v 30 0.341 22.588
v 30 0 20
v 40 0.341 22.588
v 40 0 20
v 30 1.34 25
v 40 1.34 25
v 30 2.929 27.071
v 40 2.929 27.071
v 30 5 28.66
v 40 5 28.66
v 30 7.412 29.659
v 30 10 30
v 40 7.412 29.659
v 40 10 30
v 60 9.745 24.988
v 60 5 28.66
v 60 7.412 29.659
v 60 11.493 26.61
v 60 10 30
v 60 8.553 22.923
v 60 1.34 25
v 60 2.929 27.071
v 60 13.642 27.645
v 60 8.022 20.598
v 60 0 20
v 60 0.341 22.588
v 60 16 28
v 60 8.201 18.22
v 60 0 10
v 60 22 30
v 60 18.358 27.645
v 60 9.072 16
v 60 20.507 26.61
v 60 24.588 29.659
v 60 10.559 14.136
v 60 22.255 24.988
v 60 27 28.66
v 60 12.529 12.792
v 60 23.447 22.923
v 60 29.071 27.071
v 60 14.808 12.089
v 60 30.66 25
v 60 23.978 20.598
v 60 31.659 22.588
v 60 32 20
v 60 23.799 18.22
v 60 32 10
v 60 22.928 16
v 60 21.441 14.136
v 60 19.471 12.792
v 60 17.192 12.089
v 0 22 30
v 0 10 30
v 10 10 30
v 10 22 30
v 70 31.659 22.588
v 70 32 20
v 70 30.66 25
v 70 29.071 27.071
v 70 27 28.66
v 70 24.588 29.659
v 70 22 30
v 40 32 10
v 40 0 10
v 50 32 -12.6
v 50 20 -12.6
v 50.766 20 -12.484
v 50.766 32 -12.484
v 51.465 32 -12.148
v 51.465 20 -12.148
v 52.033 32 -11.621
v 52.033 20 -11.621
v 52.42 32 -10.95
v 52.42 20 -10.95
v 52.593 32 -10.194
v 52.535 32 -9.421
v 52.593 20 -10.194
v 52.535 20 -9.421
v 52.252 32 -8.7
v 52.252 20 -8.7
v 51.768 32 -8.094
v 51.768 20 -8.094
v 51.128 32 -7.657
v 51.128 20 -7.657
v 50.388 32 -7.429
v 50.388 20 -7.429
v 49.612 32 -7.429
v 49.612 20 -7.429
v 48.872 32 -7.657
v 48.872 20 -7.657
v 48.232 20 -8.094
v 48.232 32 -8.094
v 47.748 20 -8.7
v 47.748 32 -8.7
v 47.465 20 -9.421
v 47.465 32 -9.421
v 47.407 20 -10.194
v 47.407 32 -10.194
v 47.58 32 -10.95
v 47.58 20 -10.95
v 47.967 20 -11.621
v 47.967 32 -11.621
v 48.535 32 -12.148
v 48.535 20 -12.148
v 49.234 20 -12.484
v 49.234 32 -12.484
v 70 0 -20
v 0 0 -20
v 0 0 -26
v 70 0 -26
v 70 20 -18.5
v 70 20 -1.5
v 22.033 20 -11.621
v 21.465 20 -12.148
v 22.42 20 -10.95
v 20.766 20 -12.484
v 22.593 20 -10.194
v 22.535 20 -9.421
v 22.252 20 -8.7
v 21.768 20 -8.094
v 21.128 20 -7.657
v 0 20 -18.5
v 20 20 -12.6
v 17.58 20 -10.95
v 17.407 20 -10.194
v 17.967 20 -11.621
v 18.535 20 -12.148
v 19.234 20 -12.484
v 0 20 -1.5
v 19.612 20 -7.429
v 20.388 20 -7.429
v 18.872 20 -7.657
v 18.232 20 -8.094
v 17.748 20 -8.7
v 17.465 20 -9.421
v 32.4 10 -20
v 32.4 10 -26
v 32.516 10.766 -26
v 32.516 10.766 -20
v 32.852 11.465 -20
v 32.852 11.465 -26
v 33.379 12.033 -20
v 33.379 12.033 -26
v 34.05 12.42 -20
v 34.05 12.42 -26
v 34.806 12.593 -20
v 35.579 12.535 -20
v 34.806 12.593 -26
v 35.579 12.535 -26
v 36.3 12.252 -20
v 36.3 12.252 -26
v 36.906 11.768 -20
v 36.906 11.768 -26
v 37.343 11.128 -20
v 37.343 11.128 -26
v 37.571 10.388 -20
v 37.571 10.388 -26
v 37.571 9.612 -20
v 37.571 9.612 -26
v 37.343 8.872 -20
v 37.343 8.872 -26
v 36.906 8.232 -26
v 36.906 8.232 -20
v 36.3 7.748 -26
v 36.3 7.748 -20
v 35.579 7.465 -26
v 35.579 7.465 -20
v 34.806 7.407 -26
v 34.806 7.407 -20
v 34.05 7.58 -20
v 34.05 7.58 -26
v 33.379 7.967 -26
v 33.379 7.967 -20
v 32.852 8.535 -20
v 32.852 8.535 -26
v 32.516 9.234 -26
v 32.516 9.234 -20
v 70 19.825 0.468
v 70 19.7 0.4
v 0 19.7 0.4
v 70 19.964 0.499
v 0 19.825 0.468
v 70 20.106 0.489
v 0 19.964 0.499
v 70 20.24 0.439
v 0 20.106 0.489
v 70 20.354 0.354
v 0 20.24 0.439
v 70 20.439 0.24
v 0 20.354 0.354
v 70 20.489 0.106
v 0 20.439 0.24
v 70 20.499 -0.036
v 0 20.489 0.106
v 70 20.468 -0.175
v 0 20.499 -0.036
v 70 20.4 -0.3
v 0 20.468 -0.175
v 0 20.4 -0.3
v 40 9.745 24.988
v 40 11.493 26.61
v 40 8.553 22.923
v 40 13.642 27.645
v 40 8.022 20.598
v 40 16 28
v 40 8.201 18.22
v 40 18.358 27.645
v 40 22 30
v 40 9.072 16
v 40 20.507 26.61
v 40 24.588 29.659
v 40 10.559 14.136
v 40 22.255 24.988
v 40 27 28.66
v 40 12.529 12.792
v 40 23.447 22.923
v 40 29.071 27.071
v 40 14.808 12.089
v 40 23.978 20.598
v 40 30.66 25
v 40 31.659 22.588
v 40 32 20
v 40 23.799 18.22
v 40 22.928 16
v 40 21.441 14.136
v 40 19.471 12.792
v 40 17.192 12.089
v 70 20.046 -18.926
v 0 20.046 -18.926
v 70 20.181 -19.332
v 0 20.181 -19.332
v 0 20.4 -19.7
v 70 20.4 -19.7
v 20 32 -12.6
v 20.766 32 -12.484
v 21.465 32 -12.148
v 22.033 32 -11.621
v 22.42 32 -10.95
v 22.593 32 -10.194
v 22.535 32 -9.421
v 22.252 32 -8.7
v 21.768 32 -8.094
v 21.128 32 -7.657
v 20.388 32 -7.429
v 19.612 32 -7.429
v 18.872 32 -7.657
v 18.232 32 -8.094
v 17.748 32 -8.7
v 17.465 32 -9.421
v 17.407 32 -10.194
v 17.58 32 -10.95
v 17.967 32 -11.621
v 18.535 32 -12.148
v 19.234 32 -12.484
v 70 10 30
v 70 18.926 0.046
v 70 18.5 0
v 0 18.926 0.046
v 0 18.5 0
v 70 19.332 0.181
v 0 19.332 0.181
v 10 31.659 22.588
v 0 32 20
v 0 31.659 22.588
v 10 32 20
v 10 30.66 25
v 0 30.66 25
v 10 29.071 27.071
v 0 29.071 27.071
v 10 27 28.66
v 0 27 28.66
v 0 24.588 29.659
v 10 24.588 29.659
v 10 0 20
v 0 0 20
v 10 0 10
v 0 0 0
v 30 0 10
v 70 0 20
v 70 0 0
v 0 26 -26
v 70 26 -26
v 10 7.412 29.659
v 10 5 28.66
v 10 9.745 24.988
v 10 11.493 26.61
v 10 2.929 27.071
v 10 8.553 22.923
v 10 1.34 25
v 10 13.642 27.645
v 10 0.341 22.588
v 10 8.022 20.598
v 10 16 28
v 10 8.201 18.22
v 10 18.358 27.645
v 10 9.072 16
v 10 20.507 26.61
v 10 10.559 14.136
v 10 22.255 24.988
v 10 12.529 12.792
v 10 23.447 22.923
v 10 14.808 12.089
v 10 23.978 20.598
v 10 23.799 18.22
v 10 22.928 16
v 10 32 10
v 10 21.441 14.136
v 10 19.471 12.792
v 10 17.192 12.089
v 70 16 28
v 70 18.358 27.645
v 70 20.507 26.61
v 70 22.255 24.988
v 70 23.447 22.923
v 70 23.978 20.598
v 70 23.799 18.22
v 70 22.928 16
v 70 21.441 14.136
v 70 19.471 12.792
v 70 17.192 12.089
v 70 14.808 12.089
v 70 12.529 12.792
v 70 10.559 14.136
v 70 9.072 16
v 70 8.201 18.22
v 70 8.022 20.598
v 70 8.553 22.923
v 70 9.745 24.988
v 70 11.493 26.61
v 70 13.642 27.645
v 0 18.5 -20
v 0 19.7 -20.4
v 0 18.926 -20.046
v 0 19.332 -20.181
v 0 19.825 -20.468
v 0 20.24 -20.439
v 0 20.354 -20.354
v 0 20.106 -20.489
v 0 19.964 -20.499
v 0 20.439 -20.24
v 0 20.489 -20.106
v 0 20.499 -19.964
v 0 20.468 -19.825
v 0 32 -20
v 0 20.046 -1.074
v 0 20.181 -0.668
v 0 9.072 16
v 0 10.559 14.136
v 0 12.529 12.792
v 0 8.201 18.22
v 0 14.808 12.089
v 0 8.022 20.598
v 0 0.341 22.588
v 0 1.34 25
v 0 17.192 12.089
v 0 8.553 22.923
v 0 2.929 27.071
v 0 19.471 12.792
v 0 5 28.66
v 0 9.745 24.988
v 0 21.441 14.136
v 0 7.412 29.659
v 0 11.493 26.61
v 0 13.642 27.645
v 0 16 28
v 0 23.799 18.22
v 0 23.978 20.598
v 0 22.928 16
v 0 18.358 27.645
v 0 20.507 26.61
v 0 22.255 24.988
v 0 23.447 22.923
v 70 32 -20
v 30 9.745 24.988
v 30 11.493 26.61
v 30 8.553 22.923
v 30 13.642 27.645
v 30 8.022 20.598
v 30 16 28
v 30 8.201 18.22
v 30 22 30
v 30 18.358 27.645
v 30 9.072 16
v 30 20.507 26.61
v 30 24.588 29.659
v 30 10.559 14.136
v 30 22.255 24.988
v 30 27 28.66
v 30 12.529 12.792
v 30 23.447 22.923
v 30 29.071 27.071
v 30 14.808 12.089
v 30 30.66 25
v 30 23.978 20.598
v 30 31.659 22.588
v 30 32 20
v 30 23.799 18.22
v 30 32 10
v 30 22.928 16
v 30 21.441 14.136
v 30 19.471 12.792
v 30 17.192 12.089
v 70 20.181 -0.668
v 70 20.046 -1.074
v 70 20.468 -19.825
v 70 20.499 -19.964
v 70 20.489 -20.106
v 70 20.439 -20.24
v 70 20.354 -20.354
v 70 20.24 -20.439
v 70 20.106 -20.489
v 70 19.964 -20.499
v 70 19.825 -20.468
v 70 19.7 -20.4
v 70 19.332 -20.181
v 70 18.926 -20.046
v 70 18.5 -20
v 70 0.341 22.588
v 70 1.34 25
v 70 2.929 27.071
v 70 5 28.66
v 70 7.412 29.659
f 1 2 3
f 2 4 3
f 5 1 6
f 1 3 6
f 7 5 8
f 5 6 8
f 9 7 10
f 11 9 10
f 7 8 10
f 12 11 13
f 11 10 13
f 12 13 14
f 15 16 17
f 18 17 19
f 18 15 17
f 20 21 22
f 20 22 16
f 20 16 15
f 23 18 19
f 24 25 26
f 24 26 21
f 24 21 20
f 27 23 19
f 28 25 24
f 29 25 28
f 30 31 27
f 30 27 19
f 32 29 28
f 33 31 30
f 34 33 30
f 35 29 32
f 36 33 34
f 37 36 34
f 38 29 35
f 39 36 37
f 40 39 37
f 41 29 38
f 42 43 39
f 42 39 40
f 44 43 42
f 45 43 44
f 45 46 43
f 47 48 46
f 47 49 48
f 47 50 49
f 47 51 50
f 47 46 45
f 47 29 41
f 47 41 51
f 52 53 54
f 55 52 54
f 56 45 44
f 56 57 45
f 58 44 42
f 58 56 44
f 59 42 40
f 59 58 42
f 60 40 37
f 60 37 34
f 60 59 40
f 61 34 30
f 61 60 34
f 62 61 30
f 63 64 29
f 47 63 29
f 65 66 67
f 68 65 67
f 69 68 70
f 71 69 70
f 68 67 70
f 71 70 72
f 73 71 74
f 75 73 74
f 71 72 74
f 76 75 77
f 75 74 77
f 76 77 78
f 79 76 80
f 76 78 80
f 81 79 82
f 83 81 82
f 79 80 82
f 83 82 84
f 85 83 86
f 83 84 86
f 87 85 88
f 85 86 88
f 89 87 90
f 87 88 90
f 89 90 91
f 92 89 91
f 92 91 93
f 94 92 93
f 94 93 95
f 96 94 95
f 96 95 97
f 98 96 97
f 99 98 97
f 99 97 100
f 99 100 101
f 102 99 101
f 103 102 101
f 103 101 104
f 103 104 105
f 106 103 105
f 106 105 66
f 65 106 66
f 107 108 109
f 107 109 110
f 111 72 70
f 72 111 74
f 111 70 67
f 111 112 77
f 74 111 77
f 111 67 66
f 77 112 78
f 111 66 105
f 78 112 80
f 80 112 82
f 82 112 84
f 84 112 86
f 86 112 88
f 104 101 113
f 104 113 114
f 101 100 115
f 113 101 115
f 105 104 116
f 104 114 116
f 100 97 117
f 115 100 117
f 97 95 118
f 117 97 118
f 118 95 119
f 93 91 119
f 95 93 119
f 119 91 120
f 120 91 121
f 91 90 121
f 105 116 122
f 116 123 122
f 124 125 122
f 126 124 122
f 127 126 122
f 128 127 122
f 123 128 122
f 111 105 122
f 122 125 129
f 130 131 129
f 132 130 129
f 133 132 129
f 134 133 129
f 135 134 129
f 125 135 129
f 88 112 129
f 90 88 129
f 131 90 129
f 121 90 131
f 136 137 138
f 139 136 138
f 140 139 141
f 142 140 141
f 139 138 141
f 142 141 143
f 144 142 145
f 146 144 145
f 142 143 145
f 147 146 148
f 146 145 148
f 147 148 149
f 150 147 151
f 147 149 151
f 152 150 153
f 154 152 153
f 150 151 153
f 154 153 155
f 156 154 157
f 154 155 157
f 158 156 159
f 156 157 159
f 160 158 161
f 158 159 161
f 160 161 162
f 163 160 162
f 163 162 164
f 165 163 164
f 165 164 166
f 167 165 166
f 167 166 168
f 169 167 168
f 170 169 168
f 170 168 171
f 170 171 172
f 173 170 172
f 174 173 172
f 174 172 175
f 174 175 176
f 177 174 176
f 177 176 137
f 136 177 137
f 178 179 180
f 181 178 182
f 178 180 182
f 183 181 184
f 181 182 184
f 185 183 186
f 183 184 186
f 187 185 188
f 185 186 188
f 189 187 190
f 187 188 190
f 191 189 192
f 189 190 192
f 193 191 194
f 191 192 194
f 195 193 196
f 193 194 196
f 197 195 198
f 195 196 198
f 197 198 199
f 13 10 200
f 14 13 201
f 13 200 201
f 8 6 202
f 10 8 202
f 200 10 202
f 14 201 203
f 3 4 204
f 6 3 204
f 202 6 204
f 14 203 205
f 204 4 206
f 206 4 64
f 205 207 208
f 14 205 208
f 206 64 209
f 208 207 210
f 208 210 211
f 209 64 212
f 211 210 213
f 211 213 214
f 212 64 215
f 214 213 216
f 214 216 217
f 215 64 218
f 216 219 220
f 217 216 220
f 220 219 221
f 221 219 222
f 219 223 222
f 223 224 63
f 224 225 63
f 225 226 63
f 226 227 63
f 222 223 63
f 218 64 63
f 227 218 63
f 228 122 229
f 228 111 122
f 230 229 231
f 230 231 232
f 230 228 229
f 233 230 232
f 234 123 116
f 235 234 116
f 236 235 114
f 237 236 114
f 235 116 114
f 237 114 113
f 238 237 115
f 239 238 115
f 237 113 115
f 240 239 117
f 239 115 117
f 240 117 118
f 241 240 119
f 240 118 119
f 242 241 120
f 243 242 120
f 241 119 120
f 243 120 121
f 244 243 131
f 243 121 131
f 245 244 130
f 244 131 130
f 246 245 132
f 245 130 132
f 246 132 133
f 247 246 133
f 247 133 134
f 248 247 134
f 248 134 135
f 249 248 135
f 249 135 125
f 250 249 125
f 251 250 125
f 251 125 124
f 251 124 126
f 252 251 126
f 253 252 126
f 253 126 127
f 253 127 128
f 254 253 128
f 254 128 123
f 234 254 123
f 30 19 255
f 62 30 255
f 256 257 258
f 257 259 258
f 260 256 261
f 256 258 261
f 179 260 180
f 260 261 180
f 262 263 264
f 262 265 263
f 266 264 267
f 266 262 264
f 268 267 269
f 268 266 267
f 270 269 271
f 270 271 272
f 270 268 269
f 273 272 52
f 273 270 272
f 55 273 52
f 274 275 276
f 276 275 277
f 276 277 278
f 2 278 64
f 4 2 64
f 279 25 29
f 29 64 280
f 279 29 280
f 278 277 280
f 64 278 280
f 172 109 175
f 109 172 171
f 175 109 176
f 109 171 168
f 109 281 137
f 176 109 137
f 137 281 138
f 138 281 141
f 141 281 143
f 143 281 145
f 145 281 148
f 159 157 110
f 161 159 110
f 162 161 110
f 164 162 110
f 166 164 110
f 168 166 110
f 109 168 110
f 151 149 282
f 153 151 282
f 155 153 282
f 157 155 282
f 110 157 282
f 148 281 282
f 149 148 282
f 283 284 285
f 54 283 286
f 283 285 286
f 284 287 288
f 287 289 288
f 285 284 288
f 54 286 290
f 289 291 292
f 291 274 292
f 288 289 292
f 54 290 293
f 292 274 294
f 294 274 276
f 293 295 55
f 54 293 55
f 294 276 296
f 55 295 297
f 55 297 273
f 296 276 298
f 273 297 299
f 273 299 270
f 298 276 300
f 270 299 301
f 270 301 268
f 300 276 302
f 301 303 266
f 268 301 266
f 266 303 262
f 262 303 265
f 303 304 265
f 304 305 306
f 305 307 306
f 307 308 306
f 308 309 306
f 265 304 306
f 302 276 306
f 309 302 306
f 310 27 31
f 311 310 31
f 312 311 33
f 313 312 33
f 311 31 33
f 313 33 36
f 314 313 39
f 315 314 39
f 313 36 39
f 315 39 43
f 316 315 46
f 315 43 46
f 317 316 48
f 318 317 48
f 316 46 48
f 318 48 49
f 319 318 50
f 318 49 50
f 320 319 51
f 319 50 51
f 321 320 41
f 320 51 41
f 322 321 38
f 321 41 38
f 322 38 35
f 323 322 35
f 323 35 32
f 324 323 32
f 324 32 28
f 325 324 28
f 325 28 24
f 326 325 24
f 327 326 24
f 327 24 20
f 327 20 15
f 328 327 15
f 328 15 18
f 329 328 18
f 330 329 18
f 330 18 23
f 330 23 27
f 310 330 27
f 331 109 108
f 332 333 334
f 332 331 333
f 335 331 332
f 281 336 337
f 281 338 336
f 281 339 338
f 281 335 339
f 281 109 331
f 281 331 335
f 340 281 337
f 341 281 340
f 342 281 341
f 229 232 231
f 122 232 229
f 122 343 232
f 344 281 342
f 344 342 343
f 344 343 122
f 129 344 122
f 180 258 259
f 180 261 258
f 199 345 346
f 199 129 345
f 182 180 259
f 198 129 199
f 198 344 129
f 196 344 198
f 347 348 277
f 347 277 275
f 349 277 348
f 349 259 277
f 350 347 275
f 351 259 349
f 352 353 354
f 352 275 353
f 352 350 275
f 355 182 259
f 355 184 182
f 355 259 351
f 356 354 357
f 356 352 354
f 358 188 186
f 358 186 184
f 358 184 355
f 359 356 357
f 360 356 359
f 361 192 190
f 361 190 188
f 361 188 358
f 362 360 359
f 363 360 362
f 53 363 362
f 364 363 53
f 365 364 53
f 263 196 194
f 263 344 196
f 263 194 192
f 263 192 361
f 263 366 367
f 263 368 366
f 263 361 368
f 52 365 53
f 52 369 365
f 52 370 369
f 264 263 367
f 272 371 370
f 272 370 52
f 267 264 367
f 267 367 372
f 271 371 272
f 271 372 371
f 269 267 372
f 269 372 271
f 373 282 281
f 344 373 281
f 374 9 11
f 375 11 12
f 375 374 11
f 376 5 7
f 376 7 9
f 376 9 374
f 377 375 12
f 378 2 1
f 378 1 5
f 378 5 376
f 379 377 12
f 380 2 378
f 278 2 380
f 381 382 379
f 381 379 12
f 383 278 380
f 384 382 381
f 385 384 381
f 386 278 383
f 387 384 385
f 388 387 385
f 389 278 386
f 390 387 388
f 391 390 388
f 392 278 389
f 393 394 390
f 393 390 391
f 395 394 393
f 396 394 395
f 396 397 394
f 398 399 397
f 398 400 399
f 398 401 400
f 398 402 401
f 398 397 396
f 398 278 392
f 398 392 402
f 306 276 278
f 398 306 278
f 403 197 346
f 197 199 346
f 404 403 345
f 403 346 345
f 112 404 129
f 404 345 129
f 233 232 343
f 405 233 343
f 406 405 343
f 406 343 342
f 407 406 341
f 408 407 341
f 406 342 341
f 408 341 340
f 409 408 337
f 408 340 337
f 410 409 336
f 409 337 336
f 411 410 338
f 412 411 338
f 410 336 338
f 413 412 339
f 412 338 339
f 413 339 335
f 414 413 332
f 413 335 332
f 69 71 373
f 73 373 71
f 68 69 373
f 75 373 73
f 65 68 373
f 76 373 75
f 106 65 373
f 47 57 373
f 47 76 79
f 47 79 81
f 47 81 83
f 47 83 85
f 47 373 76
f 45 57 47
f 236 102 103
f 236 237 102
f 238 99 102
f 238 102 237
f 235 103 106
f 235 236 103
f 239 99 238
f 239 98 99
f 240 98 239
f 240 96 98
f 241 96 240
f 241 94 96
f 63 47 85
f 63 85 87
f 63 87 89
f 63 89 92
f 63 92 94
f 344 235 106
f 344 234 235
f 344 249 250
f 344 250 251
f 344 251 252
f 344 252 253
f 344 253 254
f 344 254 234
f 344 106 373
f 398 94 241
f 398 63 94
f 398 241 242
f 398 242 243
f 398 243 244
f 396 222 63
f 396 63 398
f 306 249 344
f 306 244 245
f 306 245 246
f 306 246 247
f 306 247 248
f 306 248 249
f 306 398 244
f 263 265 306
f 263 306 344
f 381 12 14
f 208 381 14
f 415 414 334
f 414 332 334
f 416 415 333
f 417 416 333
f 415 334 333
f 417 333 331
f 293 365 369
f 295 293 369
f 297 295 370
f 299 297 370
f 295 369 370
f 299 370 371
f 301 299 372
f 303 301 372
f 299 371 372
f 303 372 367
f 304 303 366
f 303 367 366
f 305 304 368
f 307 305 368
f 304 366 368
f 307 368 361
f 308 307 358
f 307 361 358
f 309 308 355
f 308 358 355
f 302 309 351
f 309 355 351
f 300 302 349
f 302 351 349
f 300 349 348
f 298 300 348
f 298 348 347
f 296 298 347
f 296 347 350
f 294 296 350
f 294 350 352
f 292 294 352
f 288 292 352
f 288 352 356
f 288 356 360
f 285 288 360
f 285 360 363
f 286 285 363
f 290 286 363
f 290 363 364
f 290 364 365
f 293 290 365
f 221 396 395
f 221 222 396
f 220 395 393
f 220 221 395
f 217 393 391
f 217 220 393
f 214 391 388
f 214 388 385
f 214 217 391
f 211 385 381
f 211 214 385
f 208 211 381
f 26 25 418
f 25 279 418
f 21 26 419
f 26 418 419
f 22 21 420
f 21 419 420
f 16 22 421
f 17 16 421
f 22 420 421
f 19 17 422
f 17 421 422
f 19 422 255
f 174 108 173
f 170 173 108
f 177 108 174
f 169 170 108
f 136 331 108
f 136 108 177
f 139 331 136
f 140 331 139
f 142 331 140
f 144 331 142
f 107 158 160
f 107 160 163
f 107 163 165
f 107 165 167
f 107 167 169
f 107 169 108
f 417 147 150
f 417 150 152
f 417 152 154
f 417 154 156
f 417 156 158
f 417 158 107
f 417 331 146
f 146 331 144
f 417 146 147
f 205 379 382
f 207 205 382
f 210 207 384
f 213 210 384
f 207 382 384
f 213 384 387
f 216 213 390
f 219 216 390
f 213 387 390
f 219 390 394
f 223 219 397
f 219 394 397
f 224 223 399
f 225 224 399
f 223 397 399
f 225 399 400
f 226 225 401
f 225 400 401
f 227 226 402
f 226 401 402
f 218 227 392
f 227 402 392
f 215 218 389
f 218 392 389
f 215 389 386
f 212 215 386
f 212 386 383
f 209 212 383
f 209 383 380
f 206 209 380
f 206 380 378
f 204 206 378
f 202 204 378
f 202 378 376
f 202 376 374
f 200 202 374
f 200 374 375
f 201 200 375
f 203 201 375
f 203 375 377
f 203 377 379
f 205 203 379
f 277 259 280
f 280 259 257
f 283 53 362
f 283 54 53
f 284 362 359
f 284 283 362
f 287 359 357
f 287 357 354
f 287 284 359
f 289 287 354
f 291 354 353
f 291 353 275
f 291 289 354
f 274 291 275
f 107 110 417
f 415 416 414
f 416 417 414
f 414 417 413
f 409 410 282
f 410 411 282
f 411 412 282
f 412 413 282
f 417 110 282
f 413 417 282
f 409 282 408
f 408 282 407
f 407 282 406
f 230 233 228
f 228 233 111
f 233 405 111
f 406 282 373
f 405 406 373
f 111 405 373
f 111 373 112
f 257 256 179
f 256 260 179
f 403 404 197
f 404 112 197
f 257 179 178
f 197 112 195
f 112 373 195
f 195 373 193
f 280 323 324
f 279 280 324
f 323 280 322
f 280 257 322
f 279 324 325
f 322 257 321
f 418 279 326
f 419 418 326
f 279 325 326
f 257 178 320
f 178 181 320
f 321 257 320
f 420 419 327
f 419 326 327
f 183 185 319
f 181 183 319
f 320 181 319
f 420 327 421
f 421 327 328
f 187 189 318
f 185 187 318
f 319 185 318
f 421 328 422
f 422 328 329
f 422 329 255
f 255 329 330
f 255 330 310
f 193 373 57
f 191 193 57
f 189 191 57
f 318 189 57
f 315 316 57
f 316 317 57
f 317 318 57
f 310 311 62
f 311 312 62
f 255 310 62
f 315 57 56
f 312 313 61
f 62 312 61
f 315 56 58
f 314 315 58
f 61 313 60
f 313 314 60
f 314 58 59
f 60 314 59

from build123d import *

# Parameters (mm, degrees)
SZKIC1_W                    = 70
SZKIC1_H                    = 32
DODANIE_WYCI_GNI_CIE1_DEPTH = 10
SZKIC2_W                    = 10
SZKIC2_H                    = 32
DODANIE_WYCI_GNI_CIE2_DEPTH = 20
SZKIC3_W                    = 70
SZKIC3_H                    = 12
DODANIE_WYCI_GNI_CIE3_DEPTH = 26
SZKIC4_W                    = 70
SZKIC4_H                    = 6
DODANIE_WYCI_GNI_CIE4_DEPTH = 20
SZKIC5_R                    = 0.5
WYTNIJ_WYCI_GNI_CIE1_DEPTH  = 83.607505712
ZAOKR_GLENIE1_R             = 2
SZKIC6_R                    = 8
WYTNIJ_WYCI_GNI_CIE2_DEPTH  = 83.607505712
ZAOKR_GLENIE2_R             = 10
SZKIC7_R                    = 2.6
WYTNIJ_WYCI_GNI_CIE3_DEPTH  = 79.74007874
SZKIC8_R                    = 2.6
WYTNIJ_WYCI_GNI_CIE4_DEPTH  = 20
SFAZOWANIE1_SIZE            = 6


with BuildPart() as part:
    # Szkic1 → Dodanie-wyciągnięcie1 (new body)
    with BuildSketch(Plane.XY):
        with Locations((35, 16)):
            Rectangle(SZKIC1_W, SZKIC1_H)
    extrude(amount=DODANIE_WYCI_GNI_CIE1_DEPTH)

    # Szkic2 → Dodanie-wyciągnięcie2 (add)
    with BuildSketch(Plane.XY.offset(10)):
        with Locations((5, 16)):
            Rectangle(SZKIC2_W, SZKIC2_H)
        with Locations((35, 16)):
            Rectangle(SZKIC2_W, SZKIC2_H)
        with Locations((65, 16)):
            Rectangle(SZKIC2_W, SZKIC2_H)
    extrude(amount=DODANIE_WYCI_GNI_CIE2_DEPTH)

    # Szkic3 → Dodanie-wyciągnięcie3 (add)
    with BuildSketch(Plane(origin=(0, 0, 0), x_dir=(-1, 0, 0), z_dir=(0, 0, -1))):
        with Locations((-35, 26)):
            Rectangle(SZKIC3_W, SZKIC3_H)
    extrude(amount=DODANIE_WYCI_GNI_CIE3_DEPTH)

    # Szkic4 → Dodanie-wyciągnięcie4 (add)
    with BuildSketch(Plane.XZ.offset(-20)):
        with Locations((35, -23)):
            Rectangle(SZKIC4_W, SZKIC4_H)
    extrude(amount=DODANIE_WYCI_GNI_CIE4_DEPTH)

    # Szkic5 → Wytnij-wyciągnięcie1 (cut, through all)
    with BuildSketch(Plane.ZY):
        with Locations((-20, 20)):
            Circle(SZKIC5_R)
        with Locations((0, 20)):
            Circle(SZKIC5_R)
    extrude(amount=-WYTNIJ_WYCI_GNI_CIE1_DEPTH, mode=Mode.SUBTRACT)

    # Zaokrąglenie1
    zaokr_glenie1_edges = [part.edges().sort_by_distance(p)[0] for p in [
        (35, 19.5, -20),
        (35, 19.5, 0),
        (35, 20, -19.5),
        (35, 20, -0.5),
    ]]
    fillet(zaokr_glenie1_edges, radius=ZAOKR_GLENIE1_R)

    # Szkic6 → Wytnij-wyciągnięcie2 (cut, through all)
    with BuildSketch(Plane.ZY):
        with Locations((20, 16)):
            Circle(SZKIC6_R)
    extrude(amount=-WYTNIJ_WYCI_GNI_CIE2_DEPTH, mode=Mode.SUBTRACT)

    # Zaokrąglenie2
    zaokr_glenie2_edges = [part.edges().sort_by_distance(p)[0] for p in [
        (5, 0, 30),
        (5, 32, 30),
        (35, 0, 30),
        (35, 32, 30),
        (65, 32, 30),
        (65, 0, 30),
    ]]
    fillet(zaokr_glenie2_edges, radius=ZAOKR_GLENIE2_R)

    # Szkic7 → Wytnij-wyciągnięcie3 (cut, through all)
    with BuildSketch(Plane.XZ.offset(-20)):
        with Locations(Location((20, -10, 0), (0, 0, 270))):
            Circle(SZKIC7_R)
        with Locations(Location((50, -10, 0), (0, 0, 270))):
            Circle(SZKIC7_R)
    extrude(amount=-WYTNIJ_WYCI_GNI_CIE3_DEPTH, mode=Mode.SUBTRACT)

    # Szkic8 → Wytnij-wyciągnięcie4 (cut)
    with BuildSketch(Plane(origin=(0, 0, -26), x_dir=(-1, 0, 0), z_dir=(0, 0, -1))):
        with Locations((-35, 10)):
            Circle(SZKIC8_R)
    extrude(amount=-WYTNIJ_WYCI_GNI_CIE4_DEPTH, mode=Mode.SUBTRACT)

    # Sfazowanie1
    sfazowanie1_edges = [part.edges().sort_by_distance(p)[0] for p in [
        (35, 32, -26),
    ]]
    chamfer(sfazowanie1_edges, length=SFAZOWANIE1_SIZE)


solid = part.part
